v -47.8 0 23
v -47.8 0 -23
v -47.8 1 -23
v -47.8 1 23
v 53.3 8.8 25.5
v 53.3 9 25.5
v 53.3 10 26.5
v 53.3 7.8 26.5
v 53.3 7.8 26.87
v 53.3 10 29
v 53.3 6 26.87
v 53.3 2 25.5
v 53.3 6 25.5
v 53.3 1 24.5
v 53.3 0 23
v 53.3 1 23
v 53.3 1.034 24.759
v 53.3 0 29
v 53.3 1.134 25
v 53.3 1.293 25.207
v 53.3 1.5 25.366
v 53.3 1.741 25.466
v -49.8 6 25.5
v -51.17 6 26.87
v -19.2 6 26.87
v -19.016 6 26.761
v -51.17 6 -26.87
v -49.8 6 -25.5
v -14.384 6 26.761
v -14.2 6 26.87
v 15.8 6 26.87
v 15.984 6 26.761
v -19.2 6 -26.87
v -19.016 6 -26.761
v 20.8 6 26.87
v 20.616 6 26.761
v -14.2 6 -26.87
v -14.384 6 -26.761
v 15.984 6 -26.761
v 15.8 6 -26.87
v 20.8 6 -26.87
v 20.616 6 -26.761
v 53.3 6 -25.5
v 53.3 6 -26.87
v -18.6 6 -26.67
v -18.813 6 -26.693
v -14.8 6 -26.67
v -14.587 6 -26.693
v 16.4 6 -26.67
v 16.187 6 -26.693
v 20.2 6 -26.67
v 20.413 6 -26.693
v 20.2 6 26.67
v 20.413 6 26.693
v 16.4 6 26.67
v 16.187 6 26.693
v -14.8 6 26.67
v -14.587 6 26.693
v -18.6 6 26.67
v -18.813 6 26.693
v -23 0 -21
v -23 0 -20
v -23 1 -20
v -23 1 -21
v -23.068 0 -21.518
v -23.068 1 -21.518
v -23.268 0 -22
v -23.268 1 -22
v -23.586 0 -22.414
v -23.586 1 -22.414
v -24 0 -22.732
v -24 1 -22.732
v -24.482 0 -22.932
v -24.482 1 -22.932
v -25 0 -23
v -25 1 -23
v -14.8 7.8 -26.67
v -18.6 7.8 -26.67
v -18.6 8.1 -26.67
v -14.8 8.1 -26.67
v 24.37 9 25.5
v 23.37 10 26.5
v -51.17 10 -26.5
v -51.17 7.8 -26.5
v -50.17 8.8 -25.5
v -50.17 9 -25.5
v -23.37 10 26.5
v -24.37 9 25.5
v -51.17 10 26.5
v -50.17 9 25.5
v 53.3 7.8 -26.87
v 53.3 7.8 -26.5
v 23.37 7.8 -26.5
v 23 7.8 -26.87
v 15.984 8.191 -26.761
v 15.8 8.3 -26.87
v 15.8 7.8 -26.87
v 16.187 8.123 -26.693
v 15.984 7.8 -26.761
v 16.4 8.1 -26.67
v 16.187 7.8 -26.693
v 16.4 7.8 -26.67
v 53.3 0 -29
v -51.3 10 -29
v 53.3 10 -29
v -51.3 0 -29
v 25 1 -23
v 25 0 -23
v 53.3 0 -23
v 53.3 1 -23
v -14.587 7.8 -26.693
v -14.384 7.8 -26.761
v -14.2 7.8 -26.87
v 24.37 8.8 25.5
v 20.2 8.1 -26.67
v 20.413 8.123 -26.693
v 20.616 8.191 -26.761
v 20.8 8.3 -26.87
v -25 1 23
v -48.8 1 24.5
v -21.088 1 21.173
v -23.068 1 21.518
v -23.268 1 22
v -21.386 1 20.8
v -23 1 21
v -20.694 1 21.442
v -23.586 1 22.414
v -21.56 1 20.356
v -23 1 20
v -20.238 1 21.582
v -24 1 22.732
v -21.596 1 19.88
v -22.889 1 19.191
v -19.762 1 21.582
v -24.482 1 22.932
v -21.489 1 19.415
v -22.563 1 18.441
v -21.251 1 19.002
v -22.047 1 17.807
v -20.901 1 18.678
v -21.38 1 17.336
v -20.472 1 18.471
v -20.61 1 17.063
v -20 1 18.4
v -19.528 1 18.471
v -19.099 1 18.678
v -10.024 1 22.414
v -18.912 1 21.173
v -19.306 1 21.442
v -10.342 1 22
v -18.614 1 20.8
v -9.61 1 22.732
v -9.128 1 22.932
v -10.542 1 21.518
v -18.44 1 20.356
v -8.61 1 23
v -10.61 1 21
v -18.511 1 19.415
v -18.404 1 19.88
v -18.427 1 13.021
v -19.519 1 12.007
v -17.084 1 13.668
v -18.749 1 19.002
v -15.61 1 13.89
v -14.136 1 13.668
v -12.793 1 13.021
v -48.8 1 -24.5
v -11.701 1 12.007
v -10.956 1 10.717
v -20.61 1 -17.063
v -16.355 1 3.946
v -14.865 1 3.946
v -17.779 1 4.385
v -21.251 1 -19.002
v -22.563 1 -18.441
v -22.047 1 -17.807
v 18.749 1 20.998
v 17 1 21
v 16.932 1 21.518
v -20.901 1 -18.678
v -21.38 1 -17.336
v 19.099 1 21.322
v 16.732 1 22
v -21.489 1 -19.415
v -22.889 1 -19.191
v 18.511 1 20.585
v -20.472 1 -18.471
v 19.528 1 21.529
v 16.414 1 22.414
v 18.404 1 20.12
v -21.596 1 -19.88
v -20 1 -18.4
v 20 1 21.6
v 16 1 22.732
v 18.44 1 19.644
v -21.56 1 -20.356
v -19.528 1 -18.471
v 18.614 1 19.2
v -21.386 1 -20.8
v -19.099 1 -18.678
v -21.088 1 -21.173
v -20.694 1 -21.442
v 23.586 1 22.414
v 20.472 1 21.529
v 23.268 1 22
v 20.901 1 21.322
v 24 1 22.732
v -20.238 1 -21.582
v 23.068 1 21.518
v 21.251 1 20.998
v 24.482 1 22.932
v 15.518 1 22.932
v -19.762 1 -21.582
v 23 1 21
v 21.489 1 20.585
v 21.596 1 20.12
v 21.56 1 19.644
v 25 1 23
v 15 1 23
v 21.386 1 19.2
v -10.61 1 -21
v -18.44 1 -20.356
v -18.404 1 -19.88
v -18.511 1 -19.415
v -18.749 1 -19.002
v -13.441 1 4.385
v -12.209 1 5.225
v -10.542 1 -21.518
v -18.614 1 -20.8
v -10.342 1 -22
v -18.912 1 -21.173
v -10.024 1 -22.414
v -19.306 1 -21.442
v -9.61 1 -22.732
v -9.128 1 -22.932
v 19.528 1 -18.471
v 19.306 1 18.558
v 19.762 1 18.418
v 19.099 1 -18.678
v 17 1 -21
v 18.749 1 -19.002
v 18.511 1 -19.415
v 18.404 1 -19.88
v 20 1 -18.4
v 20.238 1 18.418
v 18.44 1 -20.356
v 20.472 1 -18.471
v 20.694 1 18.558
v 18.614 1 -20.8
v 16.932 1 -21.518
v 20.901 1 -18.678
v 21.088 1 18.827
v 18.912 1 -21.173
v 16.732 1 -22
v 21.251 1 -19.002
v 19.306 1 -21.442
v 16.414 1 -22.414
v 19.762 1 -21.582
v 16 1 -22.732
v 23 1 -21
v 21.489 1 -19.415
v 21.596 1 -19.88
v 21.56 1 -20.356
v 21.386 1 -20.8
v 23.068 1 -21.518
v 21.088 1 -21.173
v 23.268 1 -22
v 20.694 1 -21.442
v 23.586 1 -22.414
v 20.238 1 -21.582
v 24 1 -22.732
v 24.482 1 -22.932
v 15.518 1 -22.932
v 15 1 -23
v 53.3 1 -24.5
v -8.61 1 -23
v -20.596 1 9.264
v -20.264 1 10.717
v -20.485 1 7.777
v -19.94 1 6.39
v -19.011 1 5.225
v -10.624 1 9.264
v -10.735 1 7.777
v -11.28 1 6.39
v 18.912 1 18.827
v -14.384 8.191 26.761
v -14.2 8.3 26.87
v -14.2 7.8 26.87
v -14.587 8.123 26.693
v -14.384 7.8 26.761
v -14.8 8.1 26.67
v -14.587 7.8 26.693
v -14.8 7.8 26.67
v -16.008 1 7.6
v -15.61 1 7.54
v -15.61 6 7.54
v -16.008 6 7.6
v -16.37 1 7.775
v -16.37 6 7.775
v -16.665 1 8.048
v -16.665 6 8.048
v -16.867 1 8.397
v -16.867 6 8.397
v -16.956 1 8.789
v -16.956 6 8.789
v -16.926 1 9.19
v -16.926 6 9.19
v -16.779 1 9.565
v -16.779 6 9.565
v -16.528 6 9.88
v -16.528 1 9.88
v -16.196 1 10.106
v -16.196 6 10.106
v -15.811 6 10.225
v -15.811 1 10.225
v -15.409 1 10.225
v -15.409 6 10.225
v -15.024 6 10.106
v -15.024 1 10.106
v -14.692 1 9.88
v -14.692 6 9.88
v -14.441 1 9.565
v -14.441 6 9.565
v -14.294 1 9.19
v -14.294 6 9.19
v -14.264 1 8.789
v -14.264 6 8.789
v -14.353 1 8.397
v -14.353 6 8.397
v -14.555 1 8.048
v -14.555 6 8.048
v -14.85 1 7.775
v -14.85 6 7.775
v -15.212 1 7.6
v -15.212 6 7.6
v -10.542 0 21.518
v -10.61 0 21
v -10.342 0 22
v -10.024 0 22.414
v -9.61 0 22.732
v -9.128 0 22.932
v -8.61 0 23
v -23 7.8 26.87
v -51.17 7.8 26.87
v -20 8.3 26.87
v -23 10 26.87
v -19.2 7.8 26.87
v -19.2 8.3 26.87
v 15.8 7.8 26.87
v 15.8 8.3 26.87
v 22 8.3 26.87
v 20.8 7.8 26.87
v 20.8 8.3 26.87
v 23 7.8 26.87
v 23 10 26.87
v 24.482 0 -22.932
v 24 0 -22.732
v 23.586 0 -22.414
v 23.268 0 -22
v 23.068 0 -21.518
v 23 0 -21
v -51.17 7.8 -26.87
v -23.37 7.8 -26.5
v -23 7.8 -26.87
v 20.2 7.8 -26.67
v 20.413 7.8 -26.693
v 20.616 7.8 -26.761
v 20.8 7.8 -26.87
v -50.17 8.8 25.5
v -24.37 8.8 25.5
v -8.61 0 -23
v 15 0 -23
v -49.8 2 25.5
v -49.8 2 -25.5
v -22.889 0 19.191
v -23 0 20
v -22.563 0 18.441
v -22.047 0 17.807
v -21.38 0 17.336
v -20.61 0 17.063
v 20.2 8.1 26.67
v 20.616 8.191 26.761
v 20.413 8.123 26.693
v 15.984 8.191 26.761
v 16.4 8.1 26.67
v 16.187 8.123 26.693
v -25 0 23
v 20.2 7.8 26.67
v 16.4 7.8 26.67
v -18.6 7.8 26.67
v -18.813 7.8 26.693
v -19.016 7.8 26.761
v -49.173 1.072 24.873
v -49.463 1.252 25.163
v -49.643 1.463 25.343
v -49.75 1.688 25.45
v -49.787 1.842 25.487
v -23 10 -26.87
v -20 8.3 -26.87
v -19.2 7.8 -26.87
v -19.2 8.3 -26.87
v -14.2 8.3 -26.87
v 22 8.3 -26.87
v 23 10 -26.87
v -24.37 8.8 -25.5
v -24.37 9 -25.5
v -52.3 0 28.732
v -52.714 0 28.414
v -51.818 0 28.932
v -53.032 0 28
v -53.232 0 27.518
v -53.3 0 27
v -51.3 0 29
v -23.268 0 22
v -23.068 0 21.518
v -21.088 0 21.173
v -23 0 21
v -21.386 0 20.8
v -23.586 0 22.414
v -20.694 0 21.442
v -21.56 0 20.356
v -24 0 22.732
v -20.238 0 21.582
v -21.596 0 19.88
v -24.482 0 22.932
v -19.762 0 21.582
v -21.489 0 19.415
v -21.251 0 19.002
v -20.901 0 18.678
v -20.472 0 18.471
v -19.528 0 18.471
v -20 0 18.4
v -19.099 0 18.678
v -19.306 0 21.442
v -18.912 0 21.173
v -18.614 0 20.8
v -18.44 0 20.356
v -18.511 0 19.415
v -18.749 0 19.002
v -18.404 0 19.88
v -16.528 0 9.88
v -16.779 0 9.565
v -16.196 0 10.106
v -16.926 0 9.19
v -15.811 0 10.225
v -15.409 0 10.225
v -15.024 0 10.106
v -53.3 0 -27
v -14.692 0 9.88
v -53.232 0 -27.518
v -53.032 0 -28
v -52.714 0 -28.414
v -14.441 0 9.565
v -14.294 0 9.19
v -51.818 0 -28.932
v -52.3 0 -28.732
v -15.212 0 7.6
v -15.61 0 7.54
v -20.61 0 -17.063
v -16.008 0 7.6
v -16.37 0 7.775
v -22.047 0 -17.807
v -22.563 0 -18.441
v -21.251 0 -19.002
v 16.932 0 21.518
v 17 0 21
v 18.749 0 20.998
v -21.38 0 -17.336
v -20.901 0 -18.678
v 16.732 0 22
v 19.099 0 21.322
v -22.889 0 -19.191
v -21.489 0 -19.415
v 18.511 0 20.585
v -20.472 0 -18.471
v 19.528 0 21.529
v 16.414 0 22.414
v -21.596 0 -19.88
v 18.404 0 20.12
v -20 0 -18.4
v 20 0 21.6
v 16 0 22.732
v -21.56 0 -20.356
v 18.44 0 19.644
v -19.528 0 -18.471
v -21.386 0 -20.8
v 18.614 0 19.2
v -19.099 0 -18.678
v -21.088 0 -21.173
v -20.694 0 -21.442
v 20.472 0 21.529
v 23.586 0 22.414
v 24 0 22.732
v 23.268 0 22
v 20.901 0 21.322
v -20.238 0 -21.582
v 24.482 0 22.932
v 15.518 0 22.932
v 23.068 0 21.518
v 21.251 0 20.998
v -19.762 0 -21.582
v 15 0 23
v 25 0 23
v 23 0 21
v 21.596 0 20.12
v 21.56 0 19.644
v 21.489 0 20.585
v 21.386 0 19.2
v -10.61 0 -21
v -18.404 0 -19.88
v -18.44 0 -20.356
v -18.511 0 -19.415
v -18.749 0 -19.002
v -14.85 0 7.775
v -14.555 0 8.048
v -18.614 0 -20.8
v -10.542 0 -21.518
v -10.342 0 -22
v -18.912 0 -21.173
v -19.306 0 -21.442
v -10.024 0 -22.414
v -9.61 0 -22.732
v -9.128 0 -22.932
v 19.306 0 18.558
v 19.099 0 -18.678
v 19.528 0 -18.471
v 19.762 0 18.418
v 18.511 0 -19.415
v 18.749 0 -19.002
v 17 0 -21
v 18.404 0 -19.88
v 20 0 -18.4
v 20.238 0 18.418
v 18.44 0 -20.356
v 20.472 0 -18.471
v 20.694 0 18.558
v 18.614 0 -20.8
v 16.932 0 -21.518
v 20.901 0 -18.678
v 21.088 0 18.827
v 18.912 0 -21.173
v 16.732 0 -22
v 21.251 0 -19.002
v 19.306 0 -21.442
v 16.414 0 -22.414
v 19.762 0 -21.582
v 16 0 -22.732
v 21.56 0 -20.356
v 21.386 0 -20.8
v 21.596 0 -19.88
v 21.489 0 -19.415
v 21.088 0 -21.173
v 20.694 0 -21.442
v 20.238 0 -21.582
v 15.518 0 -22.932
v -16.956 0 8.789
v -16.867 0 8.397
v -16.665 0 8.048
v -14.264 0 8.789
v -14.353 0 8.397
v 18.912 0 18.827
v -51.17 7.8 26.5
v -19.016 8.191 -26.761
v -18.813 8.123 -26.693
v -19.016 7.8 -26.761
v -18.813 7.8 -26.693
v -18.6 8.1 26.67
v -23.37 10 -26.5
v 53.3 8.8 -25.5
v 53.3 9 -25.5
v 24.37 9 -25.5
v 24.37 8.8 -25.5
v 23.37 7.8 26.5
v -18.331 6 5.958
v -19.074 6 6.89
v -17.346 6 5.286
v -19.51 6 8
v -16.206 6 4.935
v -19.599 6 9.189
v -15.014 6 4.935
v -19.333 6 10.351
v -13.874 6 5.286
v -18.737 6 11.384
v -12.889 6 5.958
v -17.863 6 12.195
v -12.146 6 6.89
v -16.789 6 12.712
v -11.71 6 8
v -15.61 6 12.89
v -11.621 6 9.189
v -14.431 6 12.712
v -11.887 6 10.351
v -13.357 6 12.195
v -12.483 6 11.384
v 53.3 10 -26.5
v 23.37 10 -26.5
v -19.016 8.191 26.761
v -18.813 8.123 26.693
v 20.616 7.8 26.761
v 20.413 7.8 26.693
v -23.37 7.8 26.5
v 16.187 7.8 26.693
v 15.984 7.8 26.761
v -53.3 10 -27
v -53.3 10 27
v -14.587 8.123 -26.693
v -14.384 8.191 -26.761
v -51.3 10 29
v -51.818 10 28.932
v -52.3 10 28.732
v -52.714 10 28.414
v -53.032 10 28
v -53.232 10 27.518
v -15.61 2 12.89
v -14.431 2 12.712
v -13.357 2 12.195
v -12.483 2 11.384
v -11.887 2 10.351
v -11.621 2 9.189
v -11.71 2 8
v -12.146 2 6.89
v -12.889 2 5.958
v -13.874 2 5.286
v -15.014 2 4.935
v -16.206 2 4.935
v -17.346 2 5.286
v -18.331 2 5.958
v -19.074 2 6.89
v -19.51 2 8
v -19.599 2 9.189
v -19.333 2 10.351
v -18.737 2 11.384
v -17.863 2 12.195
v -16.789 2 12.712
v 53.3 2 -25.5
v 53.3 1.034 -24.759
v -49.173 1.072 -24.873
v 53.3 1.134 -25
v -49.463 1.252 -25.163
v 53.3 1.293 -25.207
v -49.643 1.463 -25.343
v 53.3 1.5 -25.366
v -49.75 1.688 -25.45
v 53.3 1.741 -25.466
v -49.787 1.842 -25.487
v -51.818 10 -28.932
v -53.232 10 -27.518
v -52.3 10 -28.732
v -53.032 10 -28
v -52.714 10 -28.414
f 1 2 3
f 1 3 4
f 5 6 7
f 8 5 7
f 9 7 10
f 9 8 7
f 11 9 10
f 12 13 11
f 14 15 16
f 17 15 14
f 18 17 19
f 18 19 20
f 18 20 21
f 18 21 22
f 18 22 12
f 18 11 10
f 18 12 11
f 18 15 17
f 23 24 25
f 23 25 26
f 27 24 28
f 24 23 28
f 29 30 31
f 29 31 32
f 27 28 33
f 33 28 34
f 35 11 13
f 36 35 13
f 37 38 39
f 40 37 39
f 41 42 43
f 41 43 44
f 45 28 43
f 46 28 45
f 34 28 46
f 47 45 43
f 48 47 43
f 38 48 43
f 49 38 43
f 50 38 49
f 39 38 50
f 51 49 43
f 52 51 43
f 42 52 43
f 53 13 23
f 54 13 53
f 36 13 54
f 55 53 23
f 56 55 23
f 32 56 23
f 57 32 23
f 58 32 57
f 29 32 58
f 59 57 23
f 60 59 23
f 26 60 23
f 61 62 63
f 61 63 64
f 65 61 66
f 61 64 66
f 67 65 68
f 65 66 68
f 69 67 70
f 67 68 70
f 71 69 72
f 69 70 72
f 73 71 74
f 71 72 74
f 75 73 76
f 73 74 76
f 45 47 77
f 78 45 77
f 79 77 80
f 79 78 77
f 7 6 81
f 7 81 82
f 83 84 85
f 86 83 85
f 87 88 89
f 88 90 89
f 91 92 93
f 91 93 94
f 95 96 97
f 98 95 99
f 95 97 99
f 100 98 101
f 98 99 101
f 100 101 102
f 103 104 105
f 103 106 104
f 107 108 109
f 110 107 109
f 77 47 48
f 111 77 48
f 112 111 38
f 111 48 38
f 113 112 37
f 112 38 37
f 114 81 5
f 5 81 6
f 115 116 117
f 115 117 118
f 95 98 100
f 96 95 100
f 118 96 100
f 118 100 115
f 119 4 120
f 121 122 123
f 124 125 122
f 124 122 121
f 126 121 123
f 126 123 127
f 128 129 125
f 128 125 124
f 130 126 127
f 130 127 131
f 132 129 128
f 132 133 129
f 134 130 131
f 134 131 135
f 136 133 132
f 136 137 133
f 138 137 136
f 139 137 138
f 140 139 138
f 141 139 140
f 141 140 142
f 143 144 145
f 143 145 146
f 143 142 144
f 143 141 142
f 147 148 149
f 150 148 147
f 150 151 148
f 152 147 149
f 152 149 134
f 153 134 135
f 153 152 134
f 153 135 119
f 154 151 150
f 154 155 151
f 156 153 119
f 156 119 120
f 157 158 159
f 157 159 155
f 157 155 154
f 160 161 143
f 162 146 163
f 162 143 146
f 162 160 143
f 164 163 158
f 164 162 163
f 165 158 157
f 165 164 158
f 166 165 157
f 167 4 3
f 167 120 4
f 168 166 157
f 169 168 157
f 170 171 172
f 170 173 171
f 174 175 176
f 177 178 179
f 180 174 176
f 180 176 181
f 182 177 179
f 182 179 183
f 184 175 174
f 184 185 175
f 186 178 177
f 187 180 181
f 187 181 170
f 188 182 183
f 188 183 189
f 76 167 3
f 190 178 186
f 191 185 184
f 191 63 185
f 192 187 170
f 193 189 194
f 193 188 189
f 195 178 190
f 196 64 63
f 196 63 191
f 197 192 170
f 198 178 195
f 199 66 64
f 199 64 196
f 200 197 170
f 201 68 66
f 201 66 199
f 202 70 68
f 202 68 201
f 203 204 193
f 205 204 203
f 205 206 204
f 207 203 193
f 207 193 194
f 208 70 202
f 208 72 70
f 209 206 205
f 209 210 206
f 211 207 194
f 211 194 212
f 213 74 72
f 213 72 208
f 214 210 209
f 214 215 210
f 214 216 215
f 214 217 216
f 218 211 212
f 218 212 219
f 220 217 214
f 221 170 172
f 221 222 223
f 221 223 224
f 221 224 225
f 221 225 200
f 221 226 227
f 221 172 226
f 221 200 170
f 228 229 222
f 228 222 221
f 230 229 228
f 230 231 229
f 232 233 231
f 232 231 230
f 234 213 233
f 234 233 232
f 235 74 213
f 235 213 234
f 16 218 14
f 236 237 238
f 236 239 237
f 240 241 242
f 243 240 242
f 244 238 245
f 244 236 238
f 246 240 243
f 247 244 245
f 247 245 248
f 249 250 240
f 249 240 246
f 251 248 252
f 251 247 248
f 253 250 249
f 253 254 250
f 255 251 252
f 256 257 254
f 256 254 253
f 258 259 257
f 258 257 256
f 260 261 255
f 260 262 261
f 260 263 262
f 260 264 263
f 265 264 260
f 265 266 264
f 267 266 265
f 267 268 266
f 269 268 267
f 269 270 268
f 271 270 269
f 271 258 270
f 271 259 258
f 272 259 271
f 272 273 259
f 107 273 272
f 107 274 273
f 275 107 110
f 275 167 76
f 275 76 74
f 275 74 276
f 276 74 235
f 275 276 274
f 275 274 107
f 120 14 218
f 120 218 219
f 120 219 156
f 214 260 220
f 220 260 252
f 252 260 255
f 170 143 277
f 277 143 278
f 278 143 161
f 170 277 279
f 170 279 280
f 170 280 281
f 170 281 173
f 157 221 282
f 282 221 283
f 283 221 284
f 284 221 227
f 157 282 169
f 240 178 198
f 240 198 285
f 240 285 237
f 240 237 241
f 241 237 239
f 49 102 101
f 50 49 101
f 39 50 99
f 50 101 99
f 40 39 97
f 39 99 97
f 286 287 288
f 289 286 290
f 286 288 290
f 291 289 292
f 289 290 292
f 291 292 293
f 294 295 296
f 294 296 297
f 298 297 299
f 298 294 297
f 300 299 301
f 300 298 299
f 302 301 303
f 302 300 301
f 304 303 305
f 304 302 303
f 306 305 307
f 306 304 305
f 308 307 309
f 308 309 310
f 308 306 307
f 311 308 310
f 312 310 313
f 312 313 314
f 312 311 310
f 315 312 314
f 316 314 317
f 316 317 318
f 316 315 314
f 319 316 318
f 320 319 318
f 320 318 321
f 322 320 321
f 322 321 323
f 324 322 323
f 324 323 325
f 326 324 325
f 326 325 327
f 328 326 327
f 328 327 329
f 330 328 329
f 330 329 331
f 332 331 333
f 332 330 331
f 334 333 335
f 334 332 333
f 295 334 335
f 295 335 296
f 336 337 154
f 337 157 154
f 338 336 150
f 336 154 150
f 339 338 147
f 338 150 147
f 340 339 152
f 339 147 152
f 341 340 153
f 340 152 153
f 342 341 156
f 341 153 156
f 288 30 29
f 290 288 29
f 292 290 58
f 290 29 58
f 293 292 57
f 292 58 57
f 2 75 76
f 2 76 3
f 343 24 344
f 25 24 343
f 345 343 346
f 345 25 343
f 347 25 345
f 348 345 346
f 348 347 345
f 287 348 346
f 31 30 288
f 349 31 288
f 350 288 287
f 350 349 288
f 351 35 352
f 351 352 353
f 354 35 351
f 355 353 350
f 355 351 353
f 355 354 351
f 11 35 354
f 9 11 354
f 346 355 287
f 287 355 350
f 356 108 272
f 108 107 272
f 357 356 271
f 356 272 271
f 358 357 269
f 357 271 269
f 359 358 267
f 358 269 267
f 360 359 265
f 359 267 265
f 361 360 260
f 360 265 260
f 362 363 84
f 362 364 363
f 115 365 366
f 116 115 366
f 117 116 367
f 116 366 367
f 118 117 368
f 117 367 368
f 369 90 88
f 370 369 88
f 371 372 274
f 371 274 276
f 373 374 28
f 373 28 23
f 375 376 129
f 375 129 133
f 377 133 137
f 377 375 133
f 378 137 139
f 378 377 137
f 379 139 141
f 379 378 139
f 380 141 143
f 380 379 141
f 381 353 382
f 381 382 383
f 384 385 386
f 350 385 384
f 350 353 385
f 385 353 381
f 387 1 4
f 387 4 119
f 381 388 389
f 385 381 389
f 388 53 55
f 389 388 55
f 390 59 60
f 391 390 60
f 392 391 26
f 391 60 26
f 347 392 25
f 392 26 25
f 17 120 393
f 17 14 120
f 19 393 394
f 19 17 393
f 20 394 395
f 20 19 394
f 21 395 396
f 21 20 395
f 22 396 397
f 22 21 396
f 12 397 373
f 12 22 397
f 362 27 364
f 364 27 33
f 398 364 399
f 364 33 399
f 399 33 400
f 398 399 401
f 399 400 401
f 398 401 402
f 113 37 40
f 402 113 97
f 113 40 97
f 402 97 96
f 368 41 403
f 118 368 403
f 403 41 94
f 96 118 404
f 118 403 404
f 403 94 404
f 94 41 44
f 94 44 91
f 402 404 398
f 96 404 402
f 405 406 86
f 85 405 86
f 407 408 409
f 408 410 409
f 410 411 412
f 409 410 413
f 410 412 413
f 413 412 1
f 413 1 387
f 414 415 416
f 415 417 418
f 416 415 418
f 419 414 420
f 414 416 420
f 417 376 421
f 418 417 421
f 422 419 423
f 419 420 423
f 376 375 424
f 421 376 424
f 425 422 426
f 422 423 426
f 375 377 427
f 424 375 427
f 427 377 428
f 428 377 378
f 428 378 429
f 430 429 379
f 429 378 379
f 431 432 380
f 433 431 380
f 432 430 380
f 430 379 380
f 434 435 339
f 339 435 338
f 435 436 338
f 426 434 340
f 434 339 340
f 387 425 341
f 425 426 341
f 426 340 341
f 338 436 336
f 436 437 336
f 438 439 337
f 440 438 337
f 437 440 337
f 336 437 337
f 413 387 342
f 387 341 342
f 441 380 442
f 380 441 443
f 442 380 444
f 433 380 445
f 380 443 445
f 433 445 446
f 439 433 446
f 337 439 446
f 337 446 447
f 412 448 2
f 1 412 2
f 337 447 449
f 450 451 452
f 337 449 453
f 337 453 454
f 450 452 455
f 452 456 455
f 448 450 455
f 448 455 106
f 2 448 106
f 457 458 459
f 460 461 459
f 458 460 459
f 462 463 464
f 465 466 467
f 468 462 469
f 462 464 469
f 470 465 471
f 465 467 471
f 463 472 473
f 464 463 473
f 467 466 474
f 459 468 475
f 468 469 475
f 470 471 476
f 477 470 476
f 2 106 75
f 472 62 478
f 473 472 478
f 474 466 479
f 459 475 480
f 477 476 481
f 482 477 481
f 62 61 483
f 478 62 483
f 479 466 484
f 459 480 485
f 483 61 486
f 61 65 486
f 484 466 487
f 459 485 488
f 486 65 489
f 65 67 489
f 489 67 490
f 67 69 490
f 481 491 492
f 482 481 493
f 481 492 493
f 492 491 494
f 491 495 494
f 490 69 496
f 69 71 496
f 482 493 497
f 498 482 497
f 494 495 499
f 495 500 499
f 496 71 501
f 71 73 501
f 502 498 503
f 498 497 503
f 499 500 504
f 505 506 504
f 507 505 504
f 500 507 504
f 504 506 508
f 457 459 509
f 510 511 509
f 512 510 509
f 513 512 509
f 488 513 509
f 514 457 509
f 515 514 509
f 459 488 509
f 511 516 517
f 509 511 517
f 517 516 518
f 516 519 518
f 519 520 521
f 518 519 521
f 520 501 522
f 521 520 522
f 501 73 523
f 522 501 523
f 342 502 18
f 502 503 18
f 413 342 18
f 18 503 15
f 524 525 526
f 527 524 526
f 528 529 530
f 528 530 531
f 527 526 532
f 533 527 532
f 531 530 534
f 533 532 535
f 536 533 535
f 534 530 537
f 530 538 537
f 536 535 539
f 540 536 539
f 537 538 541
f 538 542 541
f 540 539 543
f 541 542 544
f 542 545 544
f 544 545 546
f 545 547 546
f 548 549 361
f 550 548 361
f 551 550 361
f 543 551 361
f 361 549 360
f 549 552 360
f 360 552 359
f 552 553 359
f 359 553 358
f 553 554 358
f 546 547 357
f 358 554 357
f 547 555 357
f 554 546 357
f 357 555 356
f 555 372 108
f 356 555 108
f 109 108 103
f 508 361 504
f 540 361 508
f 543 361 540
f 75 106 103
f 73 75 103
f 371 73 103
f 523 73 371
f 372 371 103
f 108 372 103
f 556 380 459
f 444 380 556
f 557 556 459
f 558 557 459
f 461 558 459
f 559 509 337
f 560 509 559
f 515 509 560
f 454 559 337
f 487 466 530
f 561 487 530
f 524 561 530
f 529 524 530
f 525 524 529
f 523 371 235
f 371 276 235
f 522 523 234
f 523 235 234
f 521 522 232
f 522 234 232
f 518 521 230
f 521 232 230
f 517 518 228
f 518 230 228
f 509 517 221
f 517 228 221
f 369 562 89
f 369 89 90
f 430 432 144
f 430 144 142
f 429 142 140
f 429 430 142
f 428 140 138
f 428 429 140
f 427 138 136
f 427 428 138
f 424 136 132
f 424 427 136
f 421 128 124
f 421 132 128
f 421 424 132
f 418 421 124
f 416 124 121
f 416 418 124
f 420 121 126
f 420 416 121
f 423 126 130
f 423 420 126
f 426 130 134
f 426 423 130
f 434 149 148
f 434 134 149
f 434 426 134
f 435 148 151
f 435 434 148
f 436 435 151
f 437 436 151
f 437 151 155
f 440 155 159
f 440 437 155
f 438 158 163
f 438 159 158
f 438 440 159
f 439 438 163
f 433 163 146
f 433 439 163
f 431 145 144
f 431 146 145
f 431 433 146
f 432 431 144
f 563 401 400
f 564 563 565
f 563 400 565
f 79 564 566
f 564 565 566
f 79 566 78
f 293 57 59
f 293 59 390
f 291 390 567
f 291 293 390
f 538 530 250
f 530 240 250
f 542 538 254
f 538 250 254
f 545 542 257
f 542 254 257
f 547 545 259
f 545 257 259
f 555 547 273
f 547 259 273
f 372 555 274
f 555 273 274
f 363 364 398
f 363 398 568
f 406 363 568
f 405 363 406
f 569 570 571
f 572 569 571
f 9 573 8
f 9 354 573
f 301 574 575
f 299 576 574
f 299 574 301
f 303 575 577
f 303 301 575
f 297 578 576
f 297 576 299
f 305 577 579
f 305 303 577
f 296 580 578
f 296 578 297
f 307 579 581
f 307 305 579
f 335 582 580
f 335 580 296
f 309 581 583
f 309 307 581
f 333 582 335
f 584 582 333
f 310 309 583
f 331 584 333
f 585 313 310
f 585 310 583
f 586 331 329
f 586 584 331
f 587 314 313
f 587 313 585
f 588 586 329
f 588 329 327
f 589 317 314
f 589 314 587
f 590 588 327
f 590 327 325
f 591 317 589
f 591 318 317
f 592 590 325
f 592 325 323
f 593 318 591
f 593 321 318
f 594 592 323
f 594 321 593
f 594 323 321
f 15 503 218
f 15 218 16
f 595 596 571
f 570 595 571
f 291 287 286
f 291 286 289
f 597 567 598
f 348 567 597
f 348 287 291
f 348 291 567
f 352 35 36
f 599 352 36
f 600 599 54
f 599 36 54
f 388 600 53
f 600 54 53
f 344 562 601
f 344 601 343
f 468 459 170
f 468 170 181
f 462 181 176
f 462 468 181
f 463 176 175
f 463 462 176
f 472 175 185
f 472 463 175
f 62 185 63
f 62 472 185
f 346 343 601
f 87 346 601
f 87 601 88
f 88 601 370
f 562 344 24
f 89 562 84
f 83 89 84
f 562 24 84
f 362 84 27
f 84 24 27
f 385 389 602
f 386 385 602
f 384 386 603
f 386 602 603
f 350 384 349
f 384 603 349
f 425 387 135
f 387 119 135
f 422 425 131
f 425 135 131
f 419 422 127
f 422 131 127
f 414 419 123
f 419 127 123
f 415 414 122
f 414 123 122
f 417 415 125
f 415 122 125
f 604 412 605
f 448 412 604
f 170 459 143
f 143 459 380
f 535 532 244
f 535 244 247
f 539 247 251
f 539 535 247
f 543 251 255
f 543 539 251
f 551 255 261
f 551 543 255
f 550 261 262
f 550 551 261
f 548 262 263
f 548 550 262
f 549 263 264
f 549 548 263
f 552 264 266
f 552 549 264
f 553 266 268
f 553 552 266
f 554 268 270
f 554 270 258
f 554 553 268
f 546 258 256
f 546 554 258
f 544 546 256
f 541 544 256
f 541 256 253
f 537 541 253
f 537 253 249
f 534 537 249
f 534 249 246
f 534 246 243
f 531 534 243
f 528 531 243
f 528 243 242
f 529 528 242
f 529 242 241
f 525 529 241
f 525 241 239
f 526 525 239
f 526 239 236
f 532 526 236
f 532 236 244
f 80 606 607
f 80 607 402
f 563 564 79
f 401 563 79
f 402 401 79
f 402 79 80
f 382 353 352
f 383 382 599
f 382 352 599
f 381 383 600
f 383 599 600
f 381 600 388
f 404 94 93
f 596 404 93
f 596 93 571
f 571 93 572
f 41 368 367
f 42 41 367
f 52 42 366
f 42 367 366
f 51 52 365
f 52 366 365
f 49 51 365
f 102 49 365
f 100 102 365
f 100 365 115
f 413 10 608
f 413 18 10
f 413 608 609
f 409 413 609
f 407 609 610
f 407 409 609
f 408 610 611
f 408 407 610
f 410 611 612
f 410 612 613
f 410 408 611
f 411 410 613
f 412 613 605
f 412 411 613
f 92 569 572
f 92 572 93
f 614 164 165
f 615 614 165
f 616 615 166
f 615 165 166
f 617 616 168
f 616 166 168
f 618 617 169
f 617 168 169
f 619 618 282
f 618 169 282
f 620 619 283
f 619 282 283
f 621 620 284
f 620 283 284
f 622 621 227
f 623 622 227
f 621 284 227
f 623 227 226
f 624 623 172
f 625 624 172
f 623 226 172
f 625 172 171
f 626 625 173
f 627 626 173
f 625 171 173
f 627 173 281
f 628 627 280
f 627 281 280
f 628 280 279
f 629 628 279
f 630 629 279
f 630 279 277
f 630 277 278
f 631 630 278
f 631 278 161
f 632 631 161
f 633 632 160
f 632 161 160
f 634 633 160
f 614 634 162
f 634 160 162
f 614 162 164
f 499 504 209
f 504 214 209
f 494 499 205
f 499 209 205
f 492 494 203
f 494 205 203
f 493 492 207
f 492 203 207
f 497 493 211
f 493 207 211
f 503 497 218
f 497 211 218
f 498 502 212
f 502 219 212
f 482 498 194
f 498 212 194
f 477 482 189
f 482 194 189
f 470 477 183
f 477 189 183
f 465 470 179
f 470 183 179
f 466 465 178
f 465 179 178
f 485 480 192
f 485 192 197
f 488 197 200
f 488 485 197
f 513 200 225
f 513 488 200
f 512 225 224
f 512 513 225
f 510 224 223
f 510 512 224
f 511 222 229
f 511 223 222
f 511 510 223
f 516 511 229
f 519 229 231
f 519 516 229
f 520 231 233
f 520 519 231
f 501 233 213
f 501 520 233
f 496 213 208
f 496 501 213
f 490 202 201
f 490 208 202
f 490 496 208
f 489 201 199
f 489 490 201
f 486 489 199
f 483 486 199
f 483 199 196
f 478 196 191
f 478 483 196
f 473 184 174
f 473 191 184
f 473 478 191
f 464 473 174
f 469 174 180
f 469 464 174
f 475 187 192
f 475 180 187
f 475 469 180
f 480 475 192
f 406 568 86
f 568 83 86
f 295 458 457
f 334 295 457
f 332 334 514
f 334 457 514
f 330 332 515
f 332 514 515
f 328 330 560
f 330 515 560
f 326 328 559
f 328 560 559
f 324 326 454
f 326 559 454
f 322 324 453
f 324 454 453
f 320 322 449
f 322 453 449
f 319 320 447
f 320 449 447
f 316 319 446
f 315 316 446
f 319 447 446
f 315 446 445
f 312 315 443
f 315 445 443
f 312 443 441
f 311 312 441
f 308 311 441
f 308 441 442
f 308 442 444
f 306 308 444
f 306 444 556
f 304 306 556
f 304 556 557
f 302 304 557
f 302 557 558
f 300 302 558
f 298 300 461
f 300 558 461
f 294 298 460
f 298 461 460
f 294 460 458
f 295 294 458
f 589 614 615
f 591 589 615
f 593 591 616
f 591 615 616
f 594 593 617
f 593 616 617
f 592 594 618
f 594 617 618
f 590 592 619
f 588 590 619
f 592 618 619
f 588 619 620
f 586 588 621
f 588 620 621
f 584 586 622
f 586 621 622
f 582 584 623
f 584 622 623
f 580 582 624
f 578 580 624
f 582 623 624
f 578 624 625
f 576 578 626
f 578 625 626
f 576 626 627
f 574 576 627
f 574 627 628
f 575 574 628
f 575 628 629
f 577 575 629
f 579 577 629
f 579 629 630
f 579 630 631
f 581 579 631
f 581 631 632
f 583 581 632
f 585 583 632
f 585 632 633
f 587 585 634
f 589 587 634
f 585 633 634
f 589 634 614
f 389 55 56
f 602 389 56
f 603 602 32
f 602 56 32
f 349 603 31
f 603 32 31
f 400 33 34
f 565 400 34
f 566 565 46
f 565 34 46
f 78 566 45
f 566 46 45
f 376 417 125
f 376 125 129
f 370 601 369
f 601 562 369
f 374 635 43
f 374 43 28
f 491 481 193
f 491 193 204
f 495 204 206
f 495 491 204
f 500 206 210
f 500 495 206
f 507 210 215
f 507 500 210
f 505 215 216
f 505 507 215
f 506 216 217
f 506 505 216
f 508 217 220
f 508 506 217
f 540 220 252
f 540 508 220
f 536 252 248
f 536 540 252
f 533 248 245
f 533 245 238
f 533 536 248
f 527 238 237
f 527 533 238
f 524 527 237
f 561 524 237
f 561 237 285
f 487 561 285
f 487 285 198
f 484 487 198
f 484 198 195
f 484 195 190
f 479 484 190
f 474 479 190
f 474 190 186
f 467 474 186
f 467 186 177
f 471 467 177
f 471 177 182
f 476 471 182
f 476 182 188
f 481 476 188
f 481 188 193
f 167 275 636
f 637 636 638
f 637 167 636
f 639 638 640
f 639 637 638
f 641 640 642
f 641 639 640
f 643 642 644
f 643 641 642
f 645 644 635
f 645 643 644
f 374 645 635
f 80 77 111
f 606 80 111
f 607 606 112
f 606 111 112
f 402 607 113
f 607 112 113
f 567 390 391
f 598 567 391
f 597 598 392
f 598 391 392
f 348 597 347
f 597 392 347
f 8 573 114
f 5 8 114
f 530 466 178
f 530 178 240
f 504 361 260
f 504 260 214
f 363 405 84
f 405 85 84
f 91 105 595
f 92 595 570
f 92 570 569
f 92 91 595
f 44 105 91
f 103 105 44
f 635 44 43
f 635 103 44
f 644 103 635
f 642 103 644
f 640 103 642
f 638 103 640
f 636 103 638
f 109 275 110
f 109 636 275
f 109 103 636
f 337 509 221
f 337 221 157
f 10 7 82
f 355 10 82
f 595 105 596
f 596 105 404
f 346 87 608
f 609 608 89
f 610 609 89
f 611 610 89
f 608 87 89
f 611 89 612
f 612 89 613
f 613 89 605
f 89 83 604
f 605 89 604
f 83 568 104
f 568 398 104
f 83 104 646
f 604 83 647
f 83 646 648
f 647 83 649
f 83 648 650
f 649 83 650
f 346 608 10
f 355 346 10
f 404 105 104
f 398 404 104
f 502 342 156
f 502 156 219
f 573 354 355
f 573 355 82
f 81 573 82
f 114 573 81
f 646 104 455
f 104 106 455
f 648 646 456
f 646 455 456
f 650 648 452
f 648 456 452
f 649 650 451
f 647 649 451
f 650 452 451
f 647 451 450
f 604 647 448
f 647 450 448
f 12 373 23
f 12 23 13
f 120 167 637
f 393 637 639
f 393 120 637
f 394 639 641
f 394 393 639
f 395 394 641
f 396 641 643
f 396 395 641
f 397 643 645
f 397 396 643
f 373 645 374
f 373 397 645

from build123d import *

# Parameters (mm, degrees)
CROQUIS1_W              = 106.6
CROQUIS1_H              = 58
CROQUIS1_R              = 1.6
SALIENTE_EXTRUIR1_DEPTH = 1
REDONDEO1_R             = 2
SALIENTE_EXTRUIR2_DEPTH = 9
CROQUIS3_W              = 53.74
CROQUIS3_H              = 1.8
CORTAR_EXTRUIR2_DEPTH   = 104.47
CROQUIS10_W             = 1.37
CROQUIS10_H             = 51
CORTAR_EXTRUIR4_DEPTH   = 4
CHAFL_N1_SIZE           = 1
CROQUIS5_W              = 0.2
CROQUIS5_H              = 1.8
SALIENTE_EXTRUIR4_DEPTH = 2.5
CROQUIS4_W              = 0.2
CROQUIS4_H              = 1.8
SALIENTE_EXTRUIR3_DEPTH = 2.5
REDONDEO5_R             = 2
CROQUIS6_W              = 10
CROQUIS6_H              = 46
CROQUIS6_R              = 1.35
CROQUIS6_W_2            = 6
SALIENTE_EXTRUIR5_DEPTH = 1
REDONDEO6_R             = 2
CROQUIS7_R              = 4
CROQUIS7_R_2            = 1.35
SALIENTE_EXTRUIR6_DEPTH = 5
CHAFL_N2_SIZE           = 1
REDONDEO4_R             = 1
CORTAR_EXTRUIR3_START   = -2.2
CROQUIS9_W              = 50
CROQUIS9_H              = 53.74
CORTAR_EXTRUIR3_DEPTH   = 2.2
CORTAR_EXTRUIR5_START   = -10
CROQUIS11_R             = 1.6
CROQUIS11_W             = 5.5
CROQUIS11_H             = 46
CORTAR_EXTRUIR5_DEPTH   = 10
REDONDEO7_R             = 1
CORTAR_EXTRUIR6_START   = -2.2
CROQUIS12_W             = 2
CROQUIS12_H             = 53
CORTAR_EXTRUIR6_DEPTH   = 2.2
CHAFL_N6_SIZE           = 2
CHAFL_N8_START          = 7.8
CHAFL_N8_DEPTH          = 0.5
CHAFL_N8_START_2        = -20
CHAFL_N8_2_DEPTH        = 42


with BuildPart() as part:
    # Croquis1 → Saliente-Extruir1 (new body)
    with BuildSketch(Plane(origin=(0, 0, 0), x_dir=(1, 0, 0), z_dir=(0, 1, 0))):
        Rectangle(CROQUIS1_W, CROQUIS1_H)
        with Locations(Location((-20, 20, 0), (0, 0, 270))):
            Circle(CROQUIS1_R, mode=Mode.SUBTRACT)
        with Locations(Location((20, 20, 0), (0, 0, 90))):
            Circle(CROQUIS1_R, mode=Mode.SUBTRACT)
        with Locations(Location((20, -20, 0), (0, 0, 270))):
            Circle(CROQUIS1_R, mode=Mode.SUBTRACT)
        with Locations(Location((-20, -20, 0), (0, 0, 90))):
            Circle(CROQUIS1_R, mode=Mode.SUBTRACT)
        with BuildLine():
            Line((-23, 20), (-23, 23))
            Line((-23, 23), (-47.8, 23))
            Line((-47.8, 23), (-47.8, -23))
            Line((-47.8, -23), (-23, -23))
            Line((-23, -23), (-23, -20))
            ThreePointArc((-23, -20), (-20, -17), (-17, -20))
            Line((-17, -20), (-17, -23))
            Line((-17, -23), (17, -23))
            Line((17, -23), (17, -20))
            ThreePointArc((17, -20), (20, -17), (23, -20))
            Line((23, -20), (23, -23))
            Line((23, -23), (47.8, -23))
            Line((47.8, -23), (47.8, 23))
            Line((47.8, 23), (23, 23))
            Line((23, 23), (23, 20))
            ThreePointArc((23, 20), (20, 17), (17, 20))
            Line((17, 20), (17, 23))
            Line((17, 23), (-17, 23))
            Line((-17, 23), (-17, 20))
            ThreePointArc((-17, 20), (-20, 17), (-23, 20))
        make_face(mode=Mode.SUBTRACT)
    extrude(amount=SALIENTE_EXTRUIR1_DEPTH)

    # Redondeo1
    redondeo1_edges = [part.edges().sort_by_distance(p)[0] for p in [
        (-23, 0.5, -23),
        (-23, 0.5, 23),
        (-17, 0.5, 23),
        (17, 0.5, 23),
        (23, 0.5, 23),
        (23, 0.5, -23),
        (17, 0.5, -23),
        (-17, 0.5, -23),
    ]]
    fillet(redondeo1_edges, radius=REDONDEO1_R)

    # Croquis2 → Saliente-Extruir2 (add)
    with BuildSketch(Plane(origin=(0, 1, 0), x_dir=(1, 0, 0), z_dir=(0, 1, 0))):
        Polygon((53.3, -25.5), (53.3, -29), (-53.3, -29), (-53.3, 29), (53.3, 29), (53.3, 25.5), (-49.8, 25.5), (-49.8, -25.5), align=None)
    extrude(amount=SALIENTE_EXTRUIR2_DEPTH)

    # Croquis3 → Cortar-Extruir2 (cut)
    with BuildSketch(Plane(origin=(53.3, 0, 0), x_dir=(0, 0, -1), z_dir=(1, 0, 0))):
        with Locations((0, 6.9)):
            Rectangle(CROQUIS3_W, CROQUIS3_H)
    extrude(amount=-CORTAR_EXTRUIR2_DEPTH, mode=Mode.SUBTRACT)

    # Croquis10 → Cortar-Extruir4 (cut)
    with BuildSketch(Plane(origin=(0, 10, 0), x_dir=(1, 0, 0), z_dir=(0, 1, 0))):
        with Locations((-50.485, 0)):
            Rectangle(CROQUIS10_W, CROQUIS10_H)
    extrude(amount=-CORTAR_EXTRUIR4_DEPTH, mode=Mode.SUBTRACT)

    # Chaflán1
    chafl_n1_edges = [part.edges().sort_by_distance(p)[0] for p in [
        (1.065, 10, 25.5),
        (1.065, 10, -25.5),
        (1.065, 7.8, -25.5),
        (1.065, 7.8, 25.5),
    ]]
    chamfer(chafl_n1_edges, length=CHAFL_N1_SIZE)

    # Croquis5 → Saliente-Extruir4 (add, symmetric)
    with BuildSketch(Plane(origin=(-16.7, 0, 0), x_dir=(0, 0, -1), z_dir=(1, 0, 0))):
        with Locations((26.77, 6.9)):
            Rectangle(CROQUIS5_W, CROQUIS5_H)
        with Locations((-26.77, 6.9)):
            Rectangle(CROQUIS5_W, CROQUIS5_H)
    extrude(amount=SALIENTE_EXTRUIR4_DEPTH, both=True)

    # Croquis4 → Saliente-Extruir3 (add, symmetric)
    with BuildSketch(Plane(origin=(18.3, 0, 0), x_dir=(0, 0, -1), z_dir=(1, 0, 0))):
        with Locations((-26.77, 6.9)):
            Rectangle(CROQUIS4_W, CROQUIS4_H)
        with Locations((26.77, 6.9)):
            Rectangle(CROQUIS4_W, CROQUIS4_H)
    extrude(amount=SALIENTE_EXTRUIR3_DEPTH, both=True)

    # Redondeo5
    redondeo5_edges = [part.edges().sort_by_distance(p)[0] for p in [
        (-53.3, 5, -29),
        (-53.3, 5, 29),
    ]]
    fillet(redondeo5_edges, radius=REDONDEO5_R)

    # Croquis6 → Saliente-Extruir5 (add)
    # profile 1 of 2: a face of its own
    with BuildSketch(Plane.XZ):
        with Locations((-15.61, 0)):
            Rectangle(CROQUIS6_W, CROQUIS6_H)
        with Locations(Location((-15.61, 8.89, 0), (0, 0, 270))):
            Circle(CROQUIS6_R, mode=Mode.SUBTRACT)
    # profile 2 of 2: a face of its own
    with BuildSketch(Plane.XZ):
        with Locations((20, 0)):
            Rectangle(CROQUIS6_W_2, CROQUIS6_H)
    extrude(amount=-SALIENTE_EXTRUIR5_DEPTH)

    # Redondeo6
    redondeo6_edges = [part.edges().sort_by_distance(p)[0] for p in [
        (-10.61, 0.5, -23),
        (-10.61, 0.5, 23),
    ]]
    fillet(redondeo6_edges, radius=REDONDEO6_R)

    # Croquis7 → Saliente-Extruir6 (add)
    with BuildSketch(Plane(origin=(0, 1, 0), x_dir=(1, 0, 0), z_dir=(0, 1, 0))):
        with Locations(Location((-15.61, -8.89, 0), (0, 0, 270))):
            Circle(CROQUIS7_R)
        with Locations(Location((-15.61, -8.89, 0), (0, 0, 90))):
            Circle(CROQUIS7_R_2, mode=Mode.SUBTRACT)
    extrude(amount=SALIENTE_EXTRUIR6_DEPTH)

    # Chaflán2
    chafl_n2_edges = [part.edges().sort_by_distance(p)[0] for p in [
        (-15.61, 1, 4.89),
    ]]
    chamfer(chafl_n2_edges, length=CHAFL_N2_SIZE - 0.0001)  # a hair under: the kernel refuses the full size

    # Redondeo4
    # the kernel refuses this fillet: 1 mm, written as the material it takes off along each edge
    with BuildSketch(Plane(origin=(15.8, 6, 26.67), x_dir=(0, 0, 1), z_dir=(0, 1, 0)), Plane(origin=(-19.2, 6, 26.67), x_dir=(0, 0, 1), z_dir=(0, 1, 0)), Plane(origin=(15.8, 7.8, -26.67), x_dir=(0, 0, -1), z_dir=(0, -1, 0))) as redondeo4_piece_1:
        with BuildLine():
            CenterArc((1, 0.6), REDONDEO4_R, 180, 36.869897646)
            Line((0, 0.6), (-0.02, 0.6))
            Line((-0.02, 0.6), (-0.02, 0))
            Line((-0.02, 0), (0, -0.02))
            ThreePointArc((0, -0.02), (0.1, -0.02), (0.184, -0.012))
            Line((0.184, -0.012), (0.2, 0))
        make_face()
    extrude(amount=1.8, mode=Mode.SUBTRACT)
    with BuildSketch(Plane(origin=(20.8, 6, 26.67), x_dir=(-1, 0, 0), z_dir=(0, 1, 0)), Plane(origin=(-14.2, 6, 26.67), x_dir=(-1, 0, 0), z_dir=(0, 1, 0)), Plane(origin=(20.8, 7.8, -26.67), x_dir=(-1, 0, 0), z_dir=(0, -1, 0))) as redondeo4_piece_2:
        with BuildLine():
            CenterArc((0.6, 1), REDONDEO4_R, 233.130102354, 36.869897646)
            Line((0, 0.2), (-0.012, 0.184))
            ThreePointArc((-0.012, 0.184), (-0.02, 0.1), (-0.02, 0))
            Line((-0.02, 0), (0, -0.02))
            Line((0, -0.02), (0.6, -0.02))
            Line((0.6, -0.02), (0.6, 0))
        make_face()
    extrude(amount=1.8, mode=Mode.SUBTRACT)
    with BuildSketch(Plane(origin=(-14.2, 6, -26.67), x_dir=(-1, 0, 0), z_dir=(0, 1, 0))) as redondeo4_piece_3:
        with BuildLine():
            CenterArc((0.6, -1), REDONDEO4_R, 90, 36.869897646)
            Line((0, -0.2), (-0.012, -0.184))
            ThreePointArc((-0.012, -0.184), (-0.02, -0.1), (-0.02, 0))
            Line((-0.02, 0), (0, 0.02))
            Line((0, 0.02), (0.6, 0.02))
            Line((0.6, 0.02), (0.6, 0))
        make_face()
    extrude(amount=1.8, mode=Mode.SUBTRACT)
    with BuildSketch(Plane(origin=(-19.2, 6, -26.67), x_dir=(0, 0, -1), z_dir=(0, 1, 0))) as redondeo4_piece_4:
        with BuildLine():
            CenterArc((1, -0.6), REDONDEO4_R, 143.130102354, 36.869897646)
            Line((0, -0.6), (-0.02, -0.6))
            Line((-0.02, -0.6), (-0.02, 0))
            Line((-0.02, 0), (0, 0.02))
            ThreePointArc((0, 0.02), (0.1, 0.02), (0.184, 0.012))
            Line((0.184, 0.012), (0.2, 0))
        make_face()
    extrude(amount=1.8, mode=Mode.SUBTRACT)

    # Croquis9 → Cortar-Extruir3 (cut)
    with BuildSketch(Plane(origin=(0, 10, 0), x_dir=(1, 0, 0), z_dir=(0, 1, 0)).offset(CORTAR_EXTRUIR3_START)):
        Rectangle(CROQUIS9_W, CROQUIS9_H)
    extrude(amount=CORTAR_EXTRUIR3_DEPTH, mode=Mode.SUBTRACT)

    # Croquis11 → Cortar-Extruir5 (cut)
    with BuildSketch(Plane(origin=(0, 1, 0), x_dir=(1, 0, 0), z_dir=(0, 1, 0)).offset(CORTAR_EXTRUIR5_START)):
        with Locations(Location((-20, 20, 0), (0, 0, 270))):
            Circle(CROQUIS11_R)
        with Locations(Location((20, -20, 0), (0, 0, 270))):
            Circle(CROQUIS11_R)
        with Locations(Location((20, 20, 0), (0, 0, 270))):
            Circle(CROQUIS11_R)
        with Locations(Location((-20, -20, 0), (0, 0, 90))):
            Circle(CROQUIS11_R)
        with Locations((50.55, 0)):
            Rectangle(CROQUIS11_W, CROQUIS11_H)
    extrude(amount=CORTAR_EXTRUIR5_DEPTH, mode=Mode.SUBTRACT)

    # Redondeo7
    redondeo7_edges = [part.edges().sort_by_distance(p)[0] for p in [
        (1.75, 1, 25.5),
        (-49.8, 1, 0),
        (1.75, 1, -25.5),
    ]]
    fillet(redondeo7_edges, radius=REDONDEO7_R)

    # Croquis12 → Cortar-Extruir6 (cut)
    with BuildSketch(Plane(origin=(0, 10, 0), x_dir=(1, 0, 0), z_dir=(0, 1, 0)).offset(CORTAR_EXTRUIR6_START)):
        with Locations((-50.17, 0)):
            Rectangle(CROQUIS12_W, CROQUIS12_H)
    extrude(amount=CORTAR_EXTRUIR6_DEPTH, mode=Mode.SUBTRACT)

    # Chaflán6
    # the kernel refuses this chamfer: 2 mm, written as the material it adds along each edge
    with BuildSketch(Plane(origin=(-49.17, 2.656634024, 26.5), x_dir=(-1, 0, 0), z_dir=(0, 1, 0))) as chafl_n6_piece_1_section:
        Polygon((CHAFL_N6_SIZE, 0), (0, -CHAFL_N6_SIZE), (0, 0), align=None)
    chafl_n6_piece_1 = extrude(amount=12.486731952, mode=Mode.PRIVATE)
    chafl_n6_piece_1 = split(chafl_n6_piece_1, bisect_by=Plane(origin=(-49.17, 2.656634024, 25.5), z_dir=(0, 0, 1)), keep=Keep.TOP, mode=Mode.PRIVATE)
    chafl_n6_piece_1 = split(chafl_n6_piece_1, bisect_by=Plane(origin=(-49.17, 6.328317012, 22.828317012), z_dir=(0, -0.7071067811865476, 0.7071067811865476)), keep=Keep.TOP, mode=Mode.PRIVATE)
    chafl_n6_piece_1 = split(chafl_n6_piece_1, bisect_by=Plane(origin=(-49.17, 5.228317012, 29.071682988), z_dir=(0, 0.7071067811865476, 0.7071067811865476)), keep=Keep.TOP, mode=Mode.PRIVATE)
    add(chafl_n6_piece_1)
    with BuildSketch(Plane(origin=(-49.17, 2.656634024, -26.5), x_dir=(-1, 0, 0), z_dir=(0, 1, 0))) as chafl_n6_piece_2_section:
        Polygon((CHAFL_N6_SIZE, 0), (0, CHAFL_N6_SIZE), (0, 0), align=None)
    chafl_n6_piece_2 = extrude(amount=12.486731952, mode=Mode.PRIVATE)
    chafl_n6_piece_2 = split(chafl_n6_piece_2, bisect_by=Plane(origin=(-49.17, 2.656634024, -25.5), z_dir=(0, 0, -1)), keep=Keep.TOP, mode=Mode.PRIVATE)
    chafl_n6_piece_2 = split(chafl_n6_piece_2, bisect_by=Plane(origin=(-49.17, 6.328317012, -22.828317012), z_dir=(0, -0.7071067811865476, -0.7071067811865476)), keep=Keep.TOP, mode=Mode.PRIVATE)
    chafl_n6_piece_2 = split(chafl_n6_piece_2, bisect_by=Plane(origin=(-49.17, 5.228317012, -29.071682988), z_dir=(0, 0.7071067811865471, -0.7071067811865479)), keep=Keep.TOP, mode=Mode.PRIVATE)
    add(chafl_n6_piece_2)
    with BuildSketch(Plane(origin=(25, 7.8, 26.87), x_dir=(-1, 0, 0), z_dir=(0, 1, 0))) as chafl_n6_piece_3_section:
        Polygon((CHAFL_N6_SIZE, 0), (0, -CHAFL_N6_SIZE), (0, 0), align=None)
    chafl_n6_piece_3 = extrude(amount=2.2, mode=Mode.PRIVATE)
    chafl_n6_piece_3 = split(chafl_n6_piece_3, bisect_by=Plane(origin=(25, 7.8, 25.5), z_dir=(0, 0, 1)), keep=Keep.TOP, mode=Mode.PRIVATE)
    chafl_n6_piece_3 = split(chafl_n6_piece_3, bisect_by=Plane(origin=(25, 7.615, 26.685), z_dir=(0, 0.7071067811865476, 0.7071067811865476)), keep=Keep.TOP, mode=Mode.PRIVATE)
    chafl_n6_piece_3 = split(chafl_n6_piece_3, bisect_by=Plane(origin=(25, 9.085, 25.585), z_dir=(0, -0.7071067811865476, 0.7071067811865476)), keep=Keep.TOP, mode=Mode.PRIVATE)
    add(chafl_n6_piece_3)
    with BuildSketch(Plane(origin=(-25, 7.8, 26.87), x_dir=(1, 0, 0), z_dir=(0, 1, 0))) as chafl_n6_piece_4_section:
        Polygon((CHAFL_N6_SIZE, 0), (0, CHAFL_N6_SIZE), (0, 0), align=None)
    chafl_n6_piece_4 = extrude(amount=2.2, mode=Mode.PRIVATE)
    chafl_n6_piece_4 = split(chafl_n6_piece_4, bisect_by=Plane(origin=(-25, 7.8, 25.5), z_dir=(0, 0, 1)), keep=Keep.TOP, mode=Mode.PRIVATE)
    chafl_n6_piece_4 = split(chafl_n6_piece_4, bisect_by=Plane(origin=(-25, 9.085, 25.585), z_dir=(0, -0.7071067811865476, 0.7071067811865476)), keep=Keep.TOP, mode=Mode.PRIVATE)
    chafl_n6_piece_4 = split(chafl_n6_piece_4, bisect_by=Plane(origin=(-25, 7.615, 26.685), z_dir=(0, 0.7071067811865476, 0.7071067811865476)), keep=Keep.TOP, mode=Mode.PRIVATE)
    add(chafl_n6_piece_4)
    with BuildSketch(Plane(origin=(25, 7.8, -26.87), x_dir=(-1, 0, 0), z_dir=(0, 1, 0))) as chafl_n6_piece_5_section:
        Polygon((CHAFL_N6_SIZE, 0), (0, CHAFL_N6_SIZE), (0, 0), align=None)
    chafl_n6_piece_5 = extrude(amount=2.2, mode=Mode.PRIVATE)
    chafl_n6_piece_5 = split(chafl_n6_piece_5, bisect_by=Plane(origin=(25, 7.8, -25.5), z_dir=(0, 0, -1)), keep=Keep.TOP, mode=Mode.PRIVATE)
    chafl_n6_piece_5 = split(chafl_n6_piece_5, bisect_by=Plane(origin=(25, 9.085, -25.585), z_dir=(0, -0.7071067811865476, -0.7071067811865476)), keep=Keep.TOP, mode=Mode.PRIVATE)
    chafl_n6_piece_5 = split(chafl_n6_piece_5, bisect_by=Plane(origin=(25, 7.615, -26.685), z_dir=(0, 0.7071067811865471, -0.7071067811865479)), keep=Keep.TOP, mode=Mode.PRIVATE)
    add(chafl_n6_piece_5)
    with BuildSketch(Plane(origin=(-25, 7.8, -26.87), x_dir=(1, 0, 0), z_dir=(0, 1, 0))) as chafl_n6_piece_6_section:
        Polygon((CHAFL_N6_SIZE, 0), (0, -CHAFL_N6_SIZE), (0, 0), align=None)
    chafl_n6_piece_6 = extrude(amount=2.2, mode=Mode.PRIVATE)
    chafl_n6_piece_6 = split(chafl_n6_piece_6, bisect_by=Plane(origin=(-25, 7.8, -25.5), z_dir=(0, 0, -1)), keep=Keep.TOP, mode=Mode.PRIVATE)
    chafl_n6_piece_6 = split(chafl_n6_piece_6, bisect_by=Plane(origin=(-25, 9.085, -25.585), z_dir=(0, -0.7071067811865476, -0.7071067811865476)), keep=Keep.TOP, mode=Mode.PRIVATE)
    chafl_n6_piece_6 = split(chafl_n6_piece_6, bisect_by=Plane(origin=(-25, 7.615, -26.685), z_dir=(0, 0.7071067811865471, -0.7071067811865479)), keep=Keep.TOP, mode=Mode.PRIVATE)
    add(chafl_n6_piece_6)

    # Chaflán8: read off the stored shape, not the designer's step
    # Chaflán8 outline → Chaflán8 (add)
    with BuildSketch(Plane(origin=(0, 0, 0), x_dir=(1, 0, 0), z_dir=(0, 1, 0)).offset(CHAFL_N8_START)):
        with BuildLine():
            ThreePointArc((16.4, -26.67), (16.083772234, -26.721316702), (15.8, -26.87))
            Line((15.8, -26.87), (20.8, -26.87))
            ThreePointArc((20.8, -26.87), (20.516227766, -26.721316702), (20.2, -26.67))
            Line((20.2, -26.67), (16.4, -26.67))
        make_face()
        with BuildLine():
            Line((-14.8, -26.67), (-18.6, -26.67))
            ThreePointArc((-18.6, -26.67), (-18.916227766, -26.721316702), (-19.2, -26.87))
            Line((-19.2, -26.87), (-14.2, -26.87))
            ThreePointArc((-14.2, -26.87), (-14.483772234, -26.721316702), (-14.8, -26.67))
        make_face()
        with BuildLine():
            Line((20.8, 26.87), (15.8, 26.87))
            ThreePointArc((15.8, 26.87), (16.083772234, 26.721316702), (16.4, 26.67))
            Line((16.4, 26.67), (20.2, 26.67))
            ThreePointArc((20.2, 26.67), (20.516227766, 26.721316702), (20.8, 26.87))
        make_face()
        with BuildLine():
            Line((-18.6, 26.67), (-14.8, 26.67))
            ThreePointArc((-14.8, 26.67), (-14.483772234, 26.721316702), (-14.2, 26.87))
            Line((-14.2, 26.87), (-19.2, 26.87))
            ThreePointArc((-19.2, 26.87), (-18.916227766, 26.721316702), (-18.6, 26.67))
        make_face()
    extrude(amount=CHAFL_N8_DEPTH)

    # Chafl_n8 2 outline → Chafl_n8 2 (cut)
    with BuildSketch(Plane.YZ.offset(CHAFL_N8_START_2)):
        Polygon((8.1, -26.67), (8.3, -26.87), (8.3, -26.67), align=None)
        Polygon((8.3, 26.87), (8.1, 26.67), (8.3, 26.67), align=None)
    extrude(amount=CHAFL_N8_2_DEPTH, mode=Mode.SUBTRACT)


solid = part.part
